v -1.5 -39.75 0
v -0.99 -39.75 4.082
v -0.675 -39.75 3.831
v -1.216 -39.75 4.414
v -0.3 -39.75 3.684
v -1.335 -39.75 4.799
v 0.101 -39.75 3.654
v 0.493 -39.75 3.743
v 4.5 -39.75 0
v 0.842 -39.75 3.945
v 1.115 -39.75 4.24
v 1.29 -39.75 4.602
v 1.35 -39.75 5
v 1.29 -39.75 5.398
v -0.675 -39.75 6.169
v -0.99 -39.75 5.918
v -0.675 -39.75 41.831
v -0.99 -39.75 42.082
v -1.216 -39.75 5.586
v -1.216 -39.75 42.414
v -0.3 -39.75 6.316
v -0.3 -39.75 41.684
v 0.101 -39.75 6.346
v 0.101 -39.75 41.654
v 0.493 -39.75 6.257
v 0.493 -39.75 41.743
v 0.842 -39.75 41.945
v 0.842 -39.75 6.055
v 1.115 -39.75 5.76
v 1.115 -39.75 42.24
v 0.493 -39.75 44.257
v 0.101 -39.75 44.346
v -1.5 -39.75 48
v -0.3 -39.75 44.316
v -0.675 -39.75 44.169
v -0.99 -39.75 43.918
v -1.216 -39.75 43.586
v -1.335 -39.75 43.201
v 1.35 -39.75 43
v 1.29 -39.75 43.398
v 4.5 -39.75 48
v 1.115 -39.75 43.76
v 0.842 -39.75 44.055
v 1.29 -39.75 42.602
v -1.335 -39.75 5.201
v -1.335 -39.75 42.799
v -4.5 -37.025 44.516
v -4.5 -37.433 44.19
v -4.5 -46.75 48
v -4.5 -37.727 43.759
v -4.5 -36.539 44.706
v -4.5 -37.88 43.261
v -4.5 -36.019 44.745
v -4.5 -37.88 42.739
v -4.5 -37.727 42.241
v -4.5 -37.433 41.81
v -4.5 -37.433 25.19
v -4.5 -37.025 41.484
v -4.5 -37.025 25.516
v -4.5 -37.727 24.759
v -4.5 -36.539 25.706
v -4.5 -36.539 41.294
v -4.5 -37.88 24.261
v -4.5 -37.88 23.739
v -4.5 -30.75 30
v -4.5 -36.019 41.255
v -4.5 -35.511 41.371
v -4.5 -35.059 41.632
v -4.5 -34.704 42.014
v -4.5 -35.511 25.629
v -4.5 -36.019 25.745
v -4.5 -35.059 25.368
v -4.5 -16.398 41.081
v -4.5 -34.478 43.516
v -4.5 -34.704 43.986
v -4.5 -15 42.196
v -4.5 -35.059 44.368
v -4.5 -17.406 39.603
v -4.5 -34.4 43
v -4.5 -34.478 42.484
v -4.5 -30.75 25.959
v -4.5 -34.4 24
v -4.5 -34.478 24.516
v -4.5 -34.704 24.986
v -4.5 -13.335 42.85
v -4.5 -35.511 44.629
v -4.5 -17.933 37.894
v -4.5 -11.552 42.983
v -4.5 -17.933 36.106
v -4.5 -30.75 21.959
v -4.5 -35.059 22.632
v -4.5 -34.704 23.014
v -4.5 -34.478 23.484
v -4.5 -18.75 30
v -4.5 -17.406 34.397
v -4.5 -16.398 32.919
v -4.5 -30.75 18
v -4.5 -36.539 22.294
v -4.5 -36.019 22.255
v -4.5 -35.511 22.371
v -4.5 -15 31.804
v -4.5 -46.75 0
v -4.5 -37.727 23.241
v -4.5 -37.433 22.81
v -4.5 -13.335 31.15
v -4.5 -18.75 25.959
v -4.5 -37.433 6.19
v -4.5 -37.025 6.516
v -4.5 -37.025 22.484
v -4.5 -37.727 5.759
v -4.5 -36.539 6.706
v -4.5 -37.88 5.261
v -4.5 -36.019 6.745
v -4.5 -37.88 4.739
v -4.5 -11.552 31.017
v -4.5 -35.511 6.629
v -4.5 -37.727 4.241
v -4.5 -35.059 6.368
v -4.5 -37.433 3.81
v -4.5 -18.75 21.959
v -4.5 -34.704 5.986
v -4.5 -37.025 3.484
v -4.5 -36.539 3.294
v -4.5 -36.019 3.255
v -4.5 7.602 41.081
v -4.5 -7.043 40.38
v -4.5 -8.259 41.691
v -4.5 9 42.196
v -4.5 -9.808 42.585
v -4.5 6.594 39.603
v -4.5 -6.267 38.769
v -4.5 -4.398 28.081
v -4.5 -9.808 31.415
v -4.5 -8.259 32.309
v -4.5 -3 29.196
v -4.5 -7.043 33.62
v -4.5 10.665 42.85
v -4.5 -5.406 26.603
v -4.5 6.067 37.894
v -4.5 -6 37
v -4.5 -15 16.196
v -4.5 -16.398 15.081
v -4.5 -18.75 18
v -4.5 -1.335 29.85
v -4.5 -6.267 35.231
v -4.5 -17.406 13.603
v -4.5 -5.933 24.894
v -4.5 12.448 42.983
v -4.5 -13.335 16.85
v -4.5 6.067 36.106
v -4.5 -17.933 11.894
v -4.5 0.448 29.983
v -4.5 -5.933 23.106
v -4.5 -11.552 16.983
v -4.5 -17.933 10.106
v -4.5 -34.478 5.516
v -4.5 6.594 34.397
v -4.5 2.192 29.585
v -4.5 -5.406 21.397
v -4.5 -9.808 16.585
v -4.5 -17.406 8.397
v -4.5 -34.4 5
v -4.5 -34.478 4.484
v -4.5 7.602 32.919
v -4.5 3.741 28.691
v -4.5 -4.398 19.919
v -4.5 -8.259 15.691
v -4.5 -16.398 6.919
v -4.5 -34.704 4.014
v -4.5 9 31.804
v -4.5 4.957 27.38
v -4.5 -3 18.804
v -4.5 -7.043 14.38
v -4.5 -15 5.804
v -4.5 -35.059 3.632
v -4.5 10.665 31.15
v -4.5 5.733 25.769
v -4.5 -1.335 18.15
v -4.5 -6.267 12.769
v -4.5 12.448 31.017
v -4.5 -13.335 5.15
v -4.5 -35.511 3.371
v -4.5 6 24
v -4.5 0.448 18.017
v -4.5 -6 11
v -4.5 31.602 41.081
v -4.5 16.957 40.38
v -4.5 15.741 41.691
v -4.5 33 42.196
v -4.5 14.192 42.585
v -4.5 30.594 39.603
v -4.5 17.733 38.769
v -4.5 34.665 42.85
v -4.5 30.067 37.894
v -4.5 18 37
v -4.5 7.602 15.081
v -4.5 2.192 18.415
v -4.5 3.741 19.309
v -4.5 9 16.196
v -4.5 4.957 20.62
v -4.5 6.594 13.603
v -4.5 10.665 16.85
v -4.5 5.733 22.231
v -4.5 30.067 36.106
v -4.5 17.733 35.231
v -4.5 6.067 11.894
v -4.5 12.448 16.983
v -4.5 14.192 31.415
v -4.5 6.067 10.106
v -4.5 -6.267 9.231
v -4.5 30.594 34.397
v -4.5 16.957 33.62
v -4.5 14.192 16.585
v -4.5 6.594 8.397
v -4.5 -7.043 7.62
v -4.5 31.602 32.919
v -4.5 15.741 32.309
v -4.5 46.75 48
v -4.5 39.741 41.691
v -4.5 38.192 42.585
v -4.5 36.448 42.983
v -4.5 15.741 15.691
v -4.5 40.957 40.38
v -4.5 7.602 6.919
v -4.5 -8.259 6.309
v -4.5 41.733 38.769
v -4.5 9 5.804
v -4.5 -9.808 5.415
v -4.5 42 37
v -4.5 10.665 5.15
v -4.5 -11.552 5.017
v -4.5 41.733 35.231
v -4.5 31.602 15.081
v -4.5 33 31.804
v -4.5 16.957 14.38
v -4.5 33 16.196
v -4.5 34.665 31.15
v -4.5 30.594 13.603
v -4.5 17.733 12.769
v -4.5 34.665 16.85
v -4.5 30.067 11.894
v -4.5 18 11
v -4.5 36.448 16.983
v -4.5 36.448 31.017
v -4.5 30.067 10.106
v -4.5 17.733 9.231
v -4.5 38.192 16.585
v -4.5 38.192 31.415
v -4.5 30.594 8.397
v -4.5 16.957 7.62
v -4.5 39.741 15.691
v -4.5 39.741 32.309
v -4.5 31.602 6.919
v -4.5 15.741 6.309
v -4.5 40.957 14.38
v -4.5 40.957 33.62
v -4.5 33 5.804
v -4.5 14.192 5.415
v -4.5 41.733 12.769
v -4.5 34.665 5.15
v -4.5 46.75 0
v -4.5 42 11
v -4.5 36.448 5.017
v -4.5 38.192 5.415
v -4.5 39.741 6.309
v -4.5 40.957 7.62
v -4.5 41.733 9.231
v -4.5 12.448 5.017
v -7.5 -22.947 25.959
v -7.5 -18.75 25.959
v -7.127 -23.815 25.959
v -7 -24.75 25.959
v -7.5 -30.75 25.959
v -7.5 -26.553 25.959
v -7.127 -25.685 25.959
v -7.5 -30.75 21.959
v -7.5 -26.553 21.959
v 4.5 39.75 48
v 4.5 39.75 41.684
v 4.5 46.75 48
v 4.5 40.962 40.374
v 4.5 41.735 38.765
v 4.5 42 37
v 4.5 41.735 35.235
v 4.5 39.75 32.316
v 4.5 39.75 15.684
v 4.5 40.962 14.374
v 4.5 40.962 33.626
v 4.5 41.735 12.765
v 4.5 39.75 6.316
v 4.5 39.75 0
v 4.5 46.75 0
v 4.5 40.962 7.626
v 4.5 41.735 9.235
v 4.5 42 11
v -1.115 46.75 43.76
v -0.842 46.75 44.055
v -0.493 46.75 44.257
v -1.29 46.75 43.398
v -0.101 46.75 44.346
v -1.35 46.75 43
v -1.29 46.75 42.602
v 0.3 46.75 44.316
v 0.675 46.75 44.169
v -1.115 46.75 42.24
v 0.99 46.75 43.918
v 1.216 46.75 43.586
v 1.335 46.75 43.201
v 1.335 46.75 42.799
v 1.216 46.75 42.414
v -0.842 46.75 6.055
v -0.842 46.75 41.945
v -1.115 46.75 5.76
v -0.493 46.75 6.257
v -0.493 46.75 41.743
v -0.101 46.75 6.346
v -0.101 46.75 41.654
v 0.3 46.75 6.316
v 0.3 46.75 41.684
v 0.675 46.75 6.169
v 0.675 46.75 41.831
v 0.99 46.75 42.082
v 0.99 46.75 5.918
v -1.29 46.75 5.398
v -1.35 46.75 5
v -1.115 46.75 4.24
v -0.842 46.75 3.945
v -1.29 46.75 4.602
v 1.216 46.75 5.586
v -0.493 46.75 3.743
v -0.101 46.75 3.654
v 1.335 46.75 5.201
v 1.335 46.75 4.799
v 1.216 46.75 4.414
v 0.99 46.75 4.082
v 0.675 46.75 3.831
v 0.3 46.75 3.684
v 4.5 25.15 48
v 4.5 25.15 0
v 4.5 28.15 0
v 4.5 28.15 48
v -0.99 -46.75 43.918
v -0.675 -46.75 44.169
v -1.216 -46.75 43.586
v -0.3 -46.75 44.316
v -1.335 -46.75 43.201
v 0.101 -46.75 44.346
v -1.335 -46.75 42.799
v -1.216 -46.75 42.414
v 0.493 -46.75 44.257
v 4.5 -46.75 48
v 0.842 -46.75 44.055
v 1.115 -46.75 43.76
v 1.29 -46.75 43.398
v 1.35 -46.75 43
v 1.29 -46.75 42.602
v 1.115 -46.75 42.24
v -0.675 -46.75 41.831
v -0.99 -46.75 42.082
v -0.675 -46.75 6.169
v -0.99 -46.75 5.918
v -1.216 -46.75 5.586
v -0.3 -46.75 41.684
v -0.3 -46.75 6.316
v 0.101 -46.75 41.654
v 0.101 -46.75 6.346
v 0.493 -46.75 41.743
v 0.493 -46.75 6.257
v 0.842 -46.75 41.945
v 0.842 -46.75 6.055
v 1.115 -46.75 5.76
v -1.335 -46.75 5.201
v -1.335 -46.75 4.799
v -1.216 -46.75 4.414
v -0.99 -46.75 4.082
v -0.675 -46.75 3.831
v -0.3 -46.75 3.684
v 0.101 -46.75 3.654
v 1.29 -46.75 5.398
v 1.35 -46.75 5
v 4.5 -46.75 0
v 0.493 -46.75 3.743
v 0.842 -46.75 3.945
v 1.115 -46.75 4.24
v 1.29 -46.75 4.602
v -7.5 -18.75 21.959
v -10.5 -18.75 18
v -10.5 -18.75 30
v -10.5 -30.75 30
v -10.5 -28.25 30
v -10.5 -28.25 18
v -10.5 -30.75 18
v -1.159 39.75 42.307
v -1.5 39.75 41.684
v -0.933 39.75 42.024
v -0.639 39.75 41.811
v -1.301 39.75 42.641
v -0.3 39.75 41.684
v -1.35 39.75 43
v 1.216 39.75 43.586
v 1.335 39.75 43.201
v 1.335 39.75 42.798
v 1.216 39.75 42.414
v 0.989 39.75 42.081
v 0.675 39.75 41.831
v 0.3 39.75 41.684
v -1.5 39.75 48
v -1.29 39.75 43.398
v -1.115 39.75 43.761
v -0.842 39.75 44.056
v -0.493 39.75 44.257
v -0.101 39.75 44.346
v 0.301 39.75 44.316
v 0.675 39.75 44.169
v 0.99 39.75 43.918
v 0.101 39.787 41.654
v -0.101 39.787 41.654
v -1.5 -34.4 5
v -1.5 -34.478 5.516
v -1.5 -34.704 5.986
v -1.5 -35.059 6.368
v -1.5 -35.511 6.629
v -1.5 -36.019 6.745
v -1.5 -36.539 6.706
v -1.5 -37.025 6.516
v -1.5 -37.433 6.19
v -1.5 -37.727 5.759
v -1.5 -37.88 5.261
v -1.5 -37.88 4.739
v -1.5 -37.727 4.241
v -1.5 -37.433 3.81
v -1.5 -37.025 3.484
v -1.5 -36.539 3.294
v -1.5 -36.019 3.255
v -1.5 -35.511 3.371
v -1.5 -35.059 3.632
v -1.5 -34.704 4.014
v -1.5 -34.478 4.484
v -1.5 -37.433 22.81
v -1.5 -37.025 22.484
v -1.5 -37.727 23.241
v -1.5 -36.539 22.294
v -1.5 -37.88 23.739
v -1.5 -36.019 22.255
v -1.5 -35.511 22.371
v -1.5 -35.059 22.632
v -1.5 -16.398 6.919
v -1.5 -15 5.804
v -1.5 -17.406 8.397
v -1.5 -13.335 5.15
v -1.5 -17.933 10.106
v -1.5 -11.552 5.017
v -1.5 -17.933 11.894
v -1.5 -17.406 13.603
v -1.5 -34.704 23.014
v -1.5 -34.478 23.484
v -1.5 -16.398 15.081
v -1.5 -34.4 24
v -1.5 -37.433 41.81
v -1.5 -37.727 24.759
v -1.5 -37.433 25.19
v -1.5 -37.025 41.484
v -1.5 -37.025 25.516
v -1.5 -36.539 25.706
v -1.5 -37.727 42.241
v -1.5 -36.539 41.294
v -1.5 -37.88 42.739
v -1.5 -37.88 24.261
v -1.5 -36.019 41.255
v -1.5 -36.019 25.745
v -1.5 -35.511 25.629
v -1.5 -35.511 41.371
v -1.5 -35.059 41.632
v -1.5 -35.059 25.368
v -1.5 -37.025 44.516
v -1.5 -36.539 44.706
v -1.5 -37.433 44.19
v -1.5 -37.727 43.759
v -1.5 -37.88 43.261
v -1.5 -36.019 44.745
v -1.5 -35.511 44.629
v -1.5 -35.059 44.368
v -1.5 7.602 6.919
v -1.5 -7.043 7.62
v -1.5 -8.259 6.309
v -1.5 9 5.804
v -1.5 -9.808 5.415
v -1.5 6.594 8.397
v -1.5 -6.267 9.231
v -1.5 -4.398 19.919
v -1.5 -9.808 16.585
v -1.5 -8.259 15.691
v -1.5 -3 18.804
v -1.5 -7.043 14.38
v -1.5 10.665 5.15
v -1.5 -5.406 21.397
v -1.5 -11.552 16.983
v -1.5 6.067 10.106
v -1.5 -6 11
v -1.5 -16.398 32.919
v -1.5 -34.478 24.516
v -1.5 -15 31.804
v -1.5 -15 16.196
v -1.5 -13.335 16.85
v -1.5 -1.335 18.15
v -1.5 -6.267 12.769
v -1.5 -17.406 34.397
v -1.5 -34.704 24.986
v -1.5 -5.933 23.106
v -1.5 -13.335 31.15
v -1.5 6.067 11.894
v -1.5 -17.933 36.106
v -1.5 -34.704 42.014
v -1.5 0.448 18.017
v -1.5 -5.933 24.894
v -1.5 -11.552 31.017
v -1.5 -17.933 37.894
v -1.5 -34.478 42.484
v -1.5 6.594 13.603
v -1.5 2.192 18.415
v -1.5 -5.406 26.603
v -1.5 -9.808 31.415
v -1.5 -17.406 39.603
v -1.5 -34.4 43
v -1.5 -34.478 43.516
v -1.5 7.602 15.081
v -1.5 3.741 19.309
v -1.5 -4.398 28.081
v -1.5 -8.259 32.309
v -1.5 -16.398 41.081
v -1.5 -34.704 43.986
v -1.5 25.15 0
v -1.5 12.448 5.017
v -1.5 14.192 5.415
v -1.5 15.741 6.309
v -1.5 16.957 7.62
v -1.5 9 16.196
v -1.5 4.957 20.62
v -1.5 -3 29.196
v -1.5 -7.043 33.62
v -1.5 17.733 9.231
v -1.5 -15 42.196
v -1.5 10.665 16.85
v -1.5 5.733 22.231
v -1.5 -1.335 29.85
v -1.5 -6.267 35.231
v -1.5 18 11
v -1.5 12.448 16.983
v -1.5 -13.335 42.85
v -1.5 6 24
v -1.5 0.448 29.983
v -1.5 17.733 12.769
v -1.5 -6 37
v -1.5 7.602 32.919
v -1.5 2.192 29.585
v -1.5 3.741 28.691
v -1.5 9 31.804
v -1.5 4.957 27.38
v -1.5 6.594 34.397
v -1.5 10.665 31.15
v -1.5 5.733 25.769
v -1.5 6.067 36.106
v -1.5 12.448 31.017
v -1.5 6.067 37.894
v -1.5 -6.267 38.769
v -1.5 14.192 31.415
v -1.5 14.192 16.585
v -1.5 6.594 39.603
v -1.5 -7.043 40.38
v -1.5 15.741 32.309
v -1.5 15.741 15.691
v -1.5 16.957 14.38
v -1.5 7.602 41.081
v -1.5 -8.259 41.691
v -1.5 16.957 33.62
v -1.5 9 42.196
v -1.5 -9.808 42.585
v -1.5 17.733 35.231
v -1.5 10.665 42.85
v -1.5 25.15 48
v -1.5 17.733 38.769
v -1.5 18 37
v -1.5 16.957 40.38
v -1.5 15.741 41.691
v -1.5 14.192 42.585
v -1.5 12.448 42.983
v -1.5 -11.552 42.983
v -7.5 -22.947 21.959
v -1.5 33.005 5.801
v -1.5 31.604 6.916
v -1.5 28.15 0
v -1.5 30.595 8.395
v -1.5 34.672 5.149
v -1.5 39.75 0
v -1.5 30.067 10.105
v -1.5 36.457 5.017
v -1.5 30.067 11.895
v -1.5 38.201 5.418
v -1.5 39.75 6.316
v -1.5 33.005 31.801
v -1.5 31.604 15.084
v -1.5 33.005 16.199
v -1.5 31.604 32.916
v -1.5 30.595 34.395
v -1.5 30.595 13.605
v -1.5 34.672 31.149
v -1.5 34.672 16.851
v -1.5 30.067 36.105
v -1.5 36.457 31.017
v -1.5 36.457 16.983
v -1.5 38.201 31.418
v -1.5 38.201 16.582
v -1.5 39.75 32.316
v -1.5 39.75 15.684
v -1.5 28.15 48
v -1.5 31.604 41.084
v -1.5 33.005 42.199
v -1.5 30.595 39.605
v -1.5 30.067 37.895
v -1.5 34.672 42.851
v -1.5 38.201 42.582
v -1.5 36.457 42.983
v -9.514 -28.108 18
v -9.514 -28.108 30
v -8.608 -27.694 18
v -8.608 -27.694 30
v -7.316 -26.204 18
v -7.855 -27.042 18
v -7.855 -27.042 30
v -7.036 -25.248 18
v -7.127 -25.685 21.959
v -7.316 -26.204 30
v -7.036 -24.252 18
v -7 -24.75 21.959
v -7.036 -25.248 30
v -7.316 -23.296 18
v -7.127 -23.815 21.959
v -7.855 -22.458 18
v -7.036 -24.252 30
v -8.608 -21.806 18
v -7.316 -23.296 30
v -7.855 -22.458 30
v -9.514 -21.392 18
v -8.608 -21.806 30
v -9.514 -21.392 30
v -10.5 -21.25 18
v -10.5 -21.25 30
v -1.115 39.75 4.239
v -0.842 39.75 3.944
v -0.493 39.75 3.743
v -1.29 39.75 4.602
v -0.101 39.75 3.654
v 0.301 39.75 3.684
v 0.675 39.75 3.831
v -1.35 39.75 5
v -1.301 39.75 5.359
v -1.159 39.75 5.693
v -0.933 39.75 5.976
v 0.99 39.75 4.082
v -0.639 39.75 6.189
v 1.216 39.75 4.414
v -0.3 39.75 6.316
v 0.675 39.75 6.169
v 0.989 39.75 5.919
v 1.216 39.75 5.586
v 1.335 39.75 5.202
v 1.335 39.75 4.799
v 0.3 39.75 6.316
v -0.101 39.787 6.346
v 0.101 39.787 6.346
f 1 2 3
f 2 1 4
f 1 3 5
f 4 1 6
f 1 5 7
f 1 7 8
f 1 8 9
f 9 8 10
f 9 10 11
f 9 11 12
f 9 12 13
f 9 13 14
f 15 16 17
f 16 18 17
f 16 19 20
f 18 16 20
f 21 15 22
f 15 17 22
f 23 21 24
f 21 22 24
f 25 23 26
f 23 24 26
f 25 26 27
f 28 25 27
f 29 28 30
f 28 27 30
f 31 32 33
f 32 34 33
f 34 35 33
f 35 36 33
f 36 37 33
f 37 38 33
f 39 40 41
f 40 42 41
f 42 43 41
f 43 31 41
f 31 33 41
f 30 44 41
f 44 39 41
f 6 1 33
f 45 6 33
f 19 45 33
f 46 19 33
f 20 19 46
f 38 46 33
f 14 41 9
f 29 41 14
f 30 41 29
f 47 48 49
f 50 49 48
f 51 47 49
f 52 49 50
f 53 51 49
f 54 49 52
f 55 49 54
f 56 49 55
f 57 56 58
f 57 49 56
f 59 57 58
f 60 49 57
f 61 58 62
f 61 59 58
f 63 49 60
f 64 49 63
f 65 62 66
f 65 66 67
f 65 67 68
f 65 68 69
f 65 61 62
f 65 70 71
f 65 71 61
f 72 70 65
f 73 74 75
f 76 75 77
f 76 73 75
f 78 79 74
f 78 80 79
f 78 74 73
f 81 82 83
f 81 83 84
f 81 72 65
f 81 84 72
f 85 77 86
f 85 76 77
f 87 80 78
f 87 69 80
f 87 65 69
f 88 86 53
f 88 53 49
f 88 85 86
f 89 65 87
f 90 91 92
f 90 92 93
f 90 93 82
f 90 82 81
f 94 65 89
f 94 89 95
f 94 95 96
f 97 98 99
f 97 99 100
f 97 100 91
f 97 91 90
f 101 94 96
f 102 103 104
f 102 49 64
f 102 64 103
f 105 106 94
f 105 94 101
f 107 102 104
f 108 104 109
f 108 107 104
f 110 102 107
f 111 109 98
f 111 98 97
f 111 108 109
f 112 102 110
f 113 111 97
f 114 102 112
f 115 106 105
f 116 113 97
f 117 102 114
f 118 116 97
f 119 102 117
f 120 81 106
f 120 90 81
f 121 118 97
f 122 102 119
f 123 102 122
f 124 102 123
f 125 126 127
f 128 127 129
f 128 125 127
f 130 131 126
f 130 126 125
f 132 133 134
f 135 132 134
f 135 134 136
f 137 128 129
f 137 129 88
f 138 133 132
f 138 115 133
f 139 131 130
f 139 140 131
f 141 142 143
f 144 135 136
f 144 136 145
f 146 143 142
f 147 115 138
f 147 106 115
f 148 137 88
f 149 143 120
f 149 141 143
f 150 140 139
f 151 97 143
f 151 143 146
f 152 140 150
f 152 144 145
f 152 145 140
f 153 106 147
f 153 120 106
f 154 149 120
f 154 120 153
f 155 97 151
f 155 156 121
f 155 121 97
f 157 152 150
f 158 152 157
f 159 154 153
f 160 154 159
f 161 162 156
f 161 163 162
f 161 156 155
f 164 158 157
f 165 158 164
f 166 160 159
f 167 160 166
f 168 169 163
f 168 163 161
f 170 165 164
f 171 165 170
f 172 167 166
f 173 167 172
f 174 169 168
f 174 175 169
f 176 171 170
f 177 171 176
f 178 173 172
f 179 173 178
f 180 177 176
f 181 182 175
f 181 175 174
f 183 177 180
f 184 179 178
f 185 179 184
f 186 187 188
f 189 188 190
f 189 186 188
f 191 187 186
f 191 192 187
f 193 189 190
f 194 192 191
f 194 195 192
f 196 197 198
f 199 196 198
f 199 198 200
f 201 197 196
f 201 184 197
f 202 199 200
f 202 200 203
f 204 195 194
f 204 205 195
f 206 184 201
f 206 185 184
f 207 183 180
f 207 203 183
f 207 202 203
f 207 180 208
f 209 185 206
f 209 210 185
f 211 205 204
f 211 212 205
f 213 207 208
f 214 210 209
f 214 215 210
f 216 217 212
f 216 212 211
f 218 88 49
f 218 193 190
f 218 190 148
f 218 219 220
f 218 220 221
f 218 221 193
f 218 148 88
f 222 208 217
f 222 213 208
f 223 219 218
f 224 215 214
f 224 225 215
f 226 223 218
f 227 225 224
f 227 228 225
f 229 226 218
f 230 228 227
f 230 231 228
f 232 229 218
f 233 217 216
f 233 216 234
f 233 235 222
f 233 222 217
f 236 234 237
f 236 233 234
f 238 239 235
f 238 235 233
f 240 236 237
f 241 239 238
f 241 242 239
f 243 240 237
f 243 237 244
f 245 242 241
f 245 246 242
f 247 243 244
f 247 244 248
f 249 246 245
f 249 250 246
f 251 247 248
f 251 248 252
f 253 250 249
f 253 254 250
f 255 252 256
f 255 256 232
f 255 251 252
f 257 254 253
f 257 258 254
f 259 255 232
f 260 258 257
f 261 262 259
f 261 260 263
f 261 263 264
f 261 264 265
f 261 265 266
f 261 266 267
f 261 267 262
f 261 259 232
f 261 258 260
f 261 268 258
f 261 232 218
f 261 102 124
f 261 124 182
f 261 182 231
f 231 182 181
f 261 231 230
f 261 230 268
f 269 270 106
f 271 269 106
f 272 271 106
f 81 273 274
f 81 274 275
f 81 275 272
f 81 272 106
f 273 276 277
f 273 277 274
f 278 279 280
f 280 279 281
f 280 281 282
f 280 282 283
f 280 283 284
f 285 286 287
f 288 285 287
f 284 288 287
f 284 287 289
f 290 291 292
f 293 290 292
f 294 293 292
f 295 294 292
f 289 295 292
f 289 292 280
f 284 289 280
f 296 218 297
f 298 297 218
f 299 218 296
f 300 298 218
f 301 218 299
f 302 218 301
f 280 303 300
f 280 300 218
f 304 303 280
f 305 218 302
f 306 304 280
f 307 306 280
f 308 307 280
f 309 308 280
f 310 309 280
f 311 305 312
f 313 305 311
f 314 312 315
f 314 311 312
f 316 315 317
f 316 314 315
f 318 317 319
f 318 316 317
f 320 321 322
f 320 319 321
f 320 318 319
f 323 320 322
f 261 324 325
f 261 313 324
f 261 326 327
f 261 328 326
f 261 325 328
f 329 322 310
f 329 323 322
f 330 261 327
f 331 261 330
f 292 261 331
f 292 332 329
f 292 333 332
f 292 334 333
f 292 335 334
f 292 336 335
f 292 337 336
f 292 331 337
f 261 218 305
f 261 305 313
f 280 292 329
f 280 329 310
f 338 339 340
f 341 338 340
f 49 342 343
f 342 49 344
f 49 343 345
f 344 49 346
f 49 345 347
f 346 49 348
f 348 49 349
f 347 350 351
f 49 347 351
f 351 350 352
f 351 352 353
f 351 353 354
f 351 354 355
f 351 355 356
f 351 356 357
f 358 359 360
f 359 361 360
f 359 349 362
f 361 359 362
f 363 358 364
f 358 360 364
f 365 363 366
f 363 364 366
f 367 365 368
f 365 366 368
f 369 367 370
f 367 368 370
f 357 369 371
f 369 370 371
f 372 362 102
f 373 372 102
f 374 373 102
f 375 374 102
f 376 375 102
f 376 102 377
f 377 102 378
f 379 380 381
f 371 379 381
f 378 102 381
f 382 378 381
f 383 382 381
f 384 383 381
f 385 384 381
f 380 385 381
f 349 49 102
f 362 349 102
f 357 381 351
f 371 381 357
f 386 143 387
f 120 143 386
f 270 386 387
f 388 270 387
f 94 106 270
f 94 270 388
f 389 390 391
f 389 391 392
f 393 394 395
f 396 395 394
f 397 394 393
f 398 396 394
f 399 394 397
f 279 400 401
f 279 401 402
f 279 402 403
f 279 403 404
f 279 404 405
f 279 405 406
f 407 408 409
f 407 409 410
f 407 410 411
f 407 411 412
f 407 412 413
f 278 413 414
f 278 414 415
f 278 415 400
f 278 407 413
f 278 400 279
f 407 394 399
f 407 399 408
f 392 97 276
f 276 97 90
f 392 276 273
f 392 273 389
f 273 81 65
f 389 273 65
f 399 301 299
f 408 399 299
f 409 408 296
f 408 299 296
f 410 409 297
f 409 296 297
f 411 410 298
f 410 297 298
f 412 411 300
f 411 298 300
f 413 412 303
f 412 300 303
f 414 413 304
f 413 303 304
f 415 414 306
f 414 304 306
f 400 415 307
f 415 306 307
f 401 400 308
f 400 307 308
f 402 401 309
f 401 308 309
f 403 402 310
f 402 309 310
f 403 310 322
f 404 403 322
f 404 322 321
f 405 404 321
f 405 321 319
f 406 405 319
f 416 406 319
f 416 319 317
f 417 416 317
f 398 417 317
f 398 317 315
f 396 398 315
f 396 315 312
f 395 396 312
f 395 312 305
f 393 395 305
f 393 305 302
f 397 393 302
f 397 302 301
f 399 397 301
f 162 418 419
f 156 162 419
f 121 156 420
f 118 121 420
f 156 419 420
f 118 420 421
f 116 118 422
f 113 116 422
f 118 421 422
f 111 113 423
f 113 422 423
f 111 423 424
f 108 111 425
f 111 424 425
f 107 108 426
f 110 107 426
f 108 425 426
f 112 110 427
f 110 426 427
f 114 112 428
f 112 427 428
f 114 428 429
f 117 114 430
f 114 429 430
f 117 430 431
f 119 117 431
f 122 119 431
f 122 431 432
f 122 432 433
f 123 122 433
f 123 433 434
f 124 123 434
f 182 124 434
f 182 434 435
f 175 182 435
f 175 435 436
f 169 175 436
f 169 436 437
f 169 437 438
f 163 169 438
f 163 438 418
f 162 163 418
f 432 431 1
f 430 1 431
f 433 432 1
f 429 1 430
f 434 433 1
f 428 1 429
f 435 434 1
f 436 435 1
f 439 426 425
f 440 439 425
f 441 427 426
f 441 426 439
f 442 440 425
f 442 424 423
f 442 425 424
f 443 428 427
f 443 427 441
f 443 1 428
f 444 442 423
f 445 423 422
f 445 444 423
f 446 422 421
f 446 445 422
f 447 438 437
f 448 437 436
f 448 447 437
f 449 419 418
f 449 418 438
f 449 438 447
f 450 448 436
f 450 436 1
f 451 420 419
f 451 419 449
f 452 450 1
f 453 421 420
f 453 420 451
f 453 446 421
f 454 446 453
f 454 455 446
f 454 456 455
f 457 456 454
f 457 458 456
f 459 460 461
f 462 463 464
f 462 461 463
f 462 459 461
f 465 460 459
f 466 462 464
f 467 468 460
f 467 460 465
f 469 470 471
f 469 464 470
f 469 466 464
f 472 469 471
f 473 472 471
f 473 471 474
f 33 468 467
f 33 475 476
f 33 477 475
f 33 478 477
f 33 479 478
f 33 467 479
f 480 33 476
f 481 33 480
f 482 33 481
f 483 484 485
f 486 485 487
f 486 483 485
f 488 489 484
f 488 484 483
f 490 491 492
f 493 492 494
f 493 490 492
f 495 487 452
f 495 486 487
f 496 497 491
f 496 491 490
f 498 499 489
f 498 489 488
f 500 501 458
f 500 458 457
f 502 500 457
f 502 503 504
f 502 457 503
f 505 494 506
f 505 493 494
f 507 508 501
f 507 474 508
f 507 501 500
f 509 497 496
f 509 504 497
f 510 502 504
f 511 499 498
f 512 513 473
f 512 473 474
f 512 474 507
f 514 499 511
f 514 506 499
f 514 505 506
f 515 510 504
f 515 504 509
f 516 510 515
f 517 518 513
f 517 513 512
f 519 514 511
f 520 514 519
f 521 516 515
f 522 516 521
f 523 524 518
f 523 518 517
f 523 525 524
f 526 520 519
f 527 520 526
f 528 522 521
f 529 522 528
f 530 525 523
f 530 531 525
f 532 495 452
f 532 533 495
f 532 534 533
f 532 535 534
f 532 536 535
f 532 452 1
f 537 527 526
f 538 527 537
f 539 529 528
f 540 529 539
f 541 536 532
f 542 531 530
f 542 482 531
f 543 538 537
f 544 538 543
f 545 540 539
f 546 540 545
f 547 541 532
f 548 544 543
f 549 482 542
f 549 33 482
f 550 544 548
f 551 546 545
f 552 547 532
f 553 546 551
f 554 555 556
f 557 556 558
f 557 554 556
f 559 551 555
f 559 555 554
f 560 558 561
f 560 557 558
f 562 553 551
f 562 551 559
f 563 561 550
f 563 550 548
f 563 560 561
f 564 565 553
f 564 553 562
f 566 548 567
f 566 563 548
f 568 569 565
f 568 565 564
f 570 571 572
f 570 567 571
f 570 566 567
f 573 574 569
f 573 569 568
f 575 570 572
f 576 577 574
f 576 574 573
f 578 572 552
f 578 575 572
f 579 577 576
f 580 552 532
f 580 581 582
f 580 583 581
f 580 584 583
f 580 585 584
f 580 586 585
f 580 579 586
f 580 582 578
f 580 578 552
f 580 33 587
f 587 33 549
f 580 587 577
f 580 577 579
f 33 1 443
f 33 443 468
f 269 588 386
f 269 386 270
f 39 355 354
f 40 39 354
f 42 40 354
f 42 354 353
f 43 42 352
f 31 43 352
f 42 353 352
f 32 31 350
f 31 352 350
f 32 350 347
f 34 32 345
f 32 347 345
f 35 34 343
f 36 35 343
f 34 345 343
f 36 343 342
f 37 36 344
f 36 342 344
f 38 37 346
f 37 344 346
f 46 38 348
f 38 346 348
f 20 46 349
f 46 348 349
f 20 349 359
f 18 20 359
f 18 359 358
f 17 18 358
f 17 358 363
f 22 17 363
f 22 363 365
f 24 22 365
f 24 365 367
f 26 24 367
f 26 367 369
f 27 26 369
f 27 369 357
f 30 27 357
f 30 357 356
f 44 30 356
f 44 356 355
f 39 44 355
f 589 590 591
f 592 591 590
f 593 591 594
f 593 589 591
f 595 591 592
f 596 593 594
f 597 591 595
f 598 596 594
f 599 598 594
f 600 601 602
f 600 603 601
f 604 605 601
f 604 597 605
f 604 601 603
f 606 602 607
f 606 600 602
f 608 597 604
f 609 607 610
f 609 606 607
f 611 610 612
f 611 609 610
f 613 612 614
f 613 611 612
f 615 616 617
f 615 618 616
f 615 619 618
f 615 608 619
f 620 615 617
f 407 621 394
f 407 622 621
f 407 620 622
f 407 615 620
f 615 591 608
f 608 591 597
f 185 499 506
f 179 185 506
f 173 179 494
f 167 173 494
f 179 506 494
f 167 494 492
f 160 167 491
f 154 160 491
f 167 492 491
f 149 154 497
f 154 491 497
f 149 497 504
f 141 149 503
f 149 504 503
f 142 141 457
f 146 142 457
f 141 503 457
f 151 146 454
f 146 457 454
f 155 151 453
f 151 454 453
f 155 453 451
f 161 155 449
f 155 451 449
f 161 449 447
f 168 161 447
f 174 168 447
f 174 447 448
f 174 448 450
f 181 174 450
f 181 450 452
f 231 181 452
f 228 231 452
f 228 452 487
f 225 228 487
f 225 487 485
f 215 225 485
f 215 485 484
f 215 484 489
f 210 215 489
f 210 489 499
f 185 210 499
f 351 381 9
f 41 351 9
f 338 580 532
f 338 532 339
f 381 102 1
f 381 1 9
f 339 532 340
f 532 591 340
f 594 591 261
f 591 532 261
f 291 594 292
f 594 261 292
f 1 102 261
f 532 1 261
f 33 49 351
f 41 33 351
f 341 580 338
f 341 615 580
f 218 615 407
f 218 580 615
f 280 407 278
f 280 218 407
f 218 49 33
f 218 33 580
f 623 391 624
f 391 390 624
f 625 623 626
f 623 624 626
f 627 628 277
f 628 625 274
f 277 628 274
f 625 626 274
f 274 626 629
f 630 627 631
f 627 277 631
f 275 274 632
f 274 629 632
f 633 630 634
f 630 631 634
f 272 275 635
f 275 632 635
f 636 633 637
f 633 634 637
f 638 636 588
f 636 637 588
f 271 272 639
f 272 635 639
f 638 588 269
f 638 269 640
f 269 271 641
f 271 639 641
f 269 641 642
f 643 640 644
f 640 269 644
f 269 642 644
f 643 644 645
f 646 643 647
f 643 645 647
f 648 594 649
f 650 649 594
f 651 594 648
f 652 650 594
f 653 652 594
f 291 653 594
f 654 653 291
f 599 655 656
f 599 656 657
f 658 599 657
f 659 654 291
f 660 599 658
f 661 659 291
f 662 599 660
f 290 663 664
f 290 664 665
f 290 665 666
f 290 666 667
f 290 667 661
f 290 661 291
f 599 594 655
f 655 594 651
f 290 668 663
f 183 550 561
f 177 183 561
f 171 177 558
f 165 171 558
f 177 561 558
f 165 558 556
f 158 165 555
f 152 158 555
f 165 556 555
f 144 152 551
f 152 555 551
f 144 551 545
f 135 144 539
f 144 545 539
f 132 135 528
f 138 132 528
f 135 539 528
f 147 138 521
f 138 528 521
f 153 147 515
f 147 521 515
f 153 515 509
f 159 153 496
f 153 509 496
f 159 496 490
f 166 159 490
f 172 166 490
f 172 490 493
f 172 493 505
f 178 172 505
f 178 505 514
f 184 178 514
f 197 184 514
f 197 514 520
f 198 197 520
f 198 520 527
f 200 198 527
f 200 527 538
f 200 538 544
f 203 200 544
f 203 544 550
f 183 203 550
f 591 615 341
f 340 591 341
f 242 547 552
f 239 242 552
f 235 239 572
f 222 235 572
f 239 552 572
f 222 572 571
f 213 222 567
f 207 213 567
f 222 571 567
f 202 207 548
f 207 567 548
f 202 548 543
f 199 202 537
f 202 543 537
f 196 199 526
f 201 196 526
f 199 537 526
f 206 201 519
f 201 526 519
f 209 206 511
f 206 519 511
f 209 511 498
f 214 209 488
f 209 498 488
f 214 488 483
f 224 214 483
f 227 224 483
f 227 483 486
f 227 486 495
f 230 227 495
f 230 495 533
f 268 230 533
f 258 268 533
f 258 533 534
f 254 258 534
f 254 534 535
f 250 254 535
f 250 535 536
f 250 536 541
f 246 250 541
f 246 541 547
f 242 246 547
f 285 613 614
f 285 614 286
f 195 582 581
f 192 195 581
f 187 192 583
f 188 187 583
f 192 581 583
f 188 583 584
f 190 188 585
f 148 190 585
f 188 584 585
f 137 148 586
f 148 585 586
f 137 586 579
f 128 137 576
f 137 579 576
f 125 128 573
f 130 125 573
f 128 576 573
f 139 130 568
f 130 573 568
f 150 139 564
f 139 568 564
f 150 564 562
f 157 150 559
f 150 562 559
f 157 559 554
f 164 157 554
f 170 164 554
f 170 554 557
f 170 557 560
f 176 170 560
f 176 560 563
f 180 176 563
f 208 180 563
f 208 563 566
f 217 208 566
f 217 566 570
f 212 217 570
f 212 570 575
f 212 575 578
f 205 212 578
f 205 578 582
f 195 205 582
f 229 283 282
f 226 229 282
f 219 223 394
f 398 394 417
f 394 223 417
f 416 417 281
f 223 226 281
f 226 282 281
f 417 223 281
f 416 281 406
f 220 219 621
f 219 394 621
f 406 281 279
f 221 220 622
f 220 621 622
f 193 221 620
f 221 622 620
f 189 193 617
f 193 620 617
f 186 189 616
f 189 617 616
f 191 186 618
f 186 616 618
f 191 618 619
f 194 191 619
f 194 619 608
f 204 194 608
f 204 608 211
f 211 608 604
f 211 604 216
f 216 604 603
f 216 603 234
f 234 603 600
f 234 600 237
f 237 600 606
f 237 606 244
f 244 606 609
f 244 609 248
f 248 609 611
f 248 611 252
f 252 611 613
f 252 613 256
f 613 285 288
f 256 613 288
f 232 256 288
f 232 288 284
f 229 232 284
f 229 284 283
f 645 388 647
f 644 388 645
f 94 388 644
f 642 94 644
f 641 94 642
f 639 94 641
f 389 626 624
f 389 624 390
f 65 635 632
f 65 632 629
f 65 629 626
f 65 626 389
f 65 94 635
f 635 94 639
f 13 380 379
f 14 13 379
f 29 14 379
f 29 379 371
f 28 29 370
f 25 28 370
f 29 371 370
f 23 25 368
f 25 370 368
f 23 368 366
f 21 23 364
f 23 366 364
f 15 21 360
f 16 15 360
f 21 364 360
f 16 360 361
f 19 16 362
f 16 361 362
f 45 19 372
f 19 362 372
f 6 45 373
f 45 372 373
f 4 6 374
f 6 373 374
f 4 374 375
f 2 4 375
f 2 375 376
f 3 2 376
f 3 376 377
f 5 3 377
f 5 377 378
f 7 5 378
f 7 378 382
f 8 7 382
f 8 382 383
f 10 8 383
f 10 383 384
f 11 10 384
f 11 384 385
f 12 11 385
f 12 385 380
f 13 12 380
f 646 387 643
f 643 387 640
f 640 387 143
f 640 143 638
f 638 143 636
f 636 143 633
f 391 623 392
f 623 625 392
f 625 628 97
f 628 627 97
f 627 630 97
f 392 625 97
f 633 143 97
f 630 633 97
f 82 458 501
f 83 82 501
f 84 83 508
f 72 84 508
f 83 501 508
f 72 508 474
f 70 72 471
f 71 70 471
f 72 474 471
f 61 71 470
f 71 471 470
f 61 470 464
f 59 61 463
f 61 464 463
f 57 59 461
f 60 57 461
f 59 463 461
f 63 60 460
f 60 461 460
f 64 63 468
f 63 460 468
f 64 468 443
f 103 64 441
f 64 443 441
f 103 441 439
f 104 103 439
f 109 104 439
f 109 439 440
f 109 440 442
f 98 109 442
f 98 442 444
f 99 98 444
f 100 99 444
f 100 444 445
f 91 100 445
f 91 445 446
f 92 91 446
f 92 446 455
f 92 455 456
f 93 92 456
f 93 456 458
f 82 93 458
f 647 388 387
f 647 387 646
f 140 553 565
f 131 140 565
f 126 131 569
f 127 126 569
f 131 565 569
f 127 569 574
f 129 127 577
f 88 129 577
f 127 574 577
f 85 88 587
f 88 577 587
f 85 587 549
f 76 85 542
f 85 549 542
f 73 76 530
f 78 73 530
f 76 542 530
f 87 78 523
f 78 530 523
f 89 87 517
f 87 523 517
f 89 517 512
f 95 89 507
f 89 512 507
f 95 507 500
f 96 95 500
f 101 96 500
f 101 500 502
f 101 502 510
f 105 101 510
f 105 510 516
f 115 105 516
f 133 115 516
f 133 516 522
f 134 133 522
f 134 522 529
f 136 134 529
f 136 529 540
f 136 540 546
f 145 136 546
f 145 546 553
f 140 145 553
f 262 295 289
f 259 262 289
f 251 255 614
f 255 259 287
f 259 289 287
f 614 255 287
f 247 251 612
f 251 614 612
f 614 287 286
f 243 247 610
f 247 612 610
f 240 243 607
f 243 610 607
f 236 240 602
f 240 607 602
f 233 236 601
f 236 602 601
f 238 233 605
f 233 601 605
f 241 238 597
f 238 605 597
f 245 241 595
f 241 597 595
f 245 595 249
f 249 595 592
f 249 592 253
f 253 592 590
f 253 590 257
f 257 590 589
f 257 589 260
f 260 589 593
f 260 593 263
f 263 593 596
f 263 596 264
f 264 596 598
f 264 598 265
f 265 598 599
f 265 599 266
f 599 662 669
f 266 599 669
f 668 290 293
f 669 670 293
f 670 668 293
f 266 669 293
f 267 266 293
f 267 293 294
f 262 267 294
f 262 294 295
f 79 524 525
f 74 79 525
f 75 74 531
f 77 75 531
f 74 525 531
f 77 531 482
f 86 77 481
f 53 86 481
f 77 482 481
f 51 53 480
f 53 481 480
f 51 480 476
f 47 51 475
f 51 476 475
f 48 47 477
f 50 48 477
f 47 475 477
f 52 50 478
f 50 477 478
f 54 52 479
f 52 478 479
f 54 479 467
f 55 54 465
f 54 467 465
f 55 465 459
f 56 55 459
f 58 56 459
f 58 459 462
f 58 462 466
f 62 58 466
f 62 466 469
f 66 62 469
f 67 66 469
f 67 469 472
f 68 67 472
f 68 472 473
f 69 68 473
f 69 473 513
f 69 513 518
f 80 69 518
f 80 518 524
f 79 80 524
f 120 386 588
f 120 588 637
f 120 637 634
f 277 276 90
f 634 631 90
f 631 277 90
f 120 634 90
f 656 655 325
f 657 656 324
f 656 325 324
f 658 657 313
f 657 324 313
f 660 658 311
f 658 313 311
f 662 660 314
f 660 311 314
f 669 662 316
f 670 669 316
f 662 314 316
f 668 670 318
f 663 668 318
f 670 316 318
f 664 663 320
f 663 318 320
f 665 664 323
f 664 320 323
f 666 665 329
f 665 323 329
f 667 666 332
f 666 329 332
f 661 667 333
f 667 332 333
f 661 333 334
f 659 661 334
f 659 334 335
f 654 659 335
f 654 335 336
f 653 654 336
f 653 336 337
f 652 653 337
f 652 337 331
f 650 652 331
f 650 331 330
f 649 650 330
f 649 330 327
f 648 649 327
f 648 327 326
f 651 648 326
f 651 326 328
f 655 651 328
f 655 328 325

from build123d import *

# Parameters (mm, degrees)
F0_W      = 9
F0_H      = 93.5
F1_DEPTH  = 48
F2_R      = 1.35
F3_DEPTH  = 8
F4_R      = 1.35
F5_DEPTH  = 8
F6_R      = 1.75
F7_DEPTH  = 9.001
F8_R      = 6
F9_DEPTH  = 9.001
F10_W     = 6
F10_H     = 64.9
F10_H_2   = 11.6
F11_DEPTH = 48.001
F12_W     = 12
F12_H     = 12
F13_DEPTH = 6
F14_W     = 3
F14_H     = 4
F15_DEPTH = 12
F16_R     = 3.5
F17_DEPTH = 30.001


with BuildPart() as f1:
    # F0 (on Top) → F1 (new body)
    with BuildSketch(Plane.XY):
        Rectangle(F0_W, F0_H)
    extrude(amount=F1_DEPTH)

    # F2 (on face) → F3 (cut)
    with BuildSketch(Plane.XZ.offset(46.75)):
        with Locations((0, 43)):
            Circle(F2_R)
        with Locations((0, 5)):
            Circle(F2_R)
    extrude(amount=-F3_DEPTH, mode=Mode.SUBTRACT)

    # F4 (on face) → F5 (cut)
    with BuildSketch(Plane(origin=(0, 46.75, 0), x_dir=(-1, 0, 0), z_dir=(0, 1, 0))):
        with Locations((0, 43)):
            Circle(F4_R)
        with Locations((0, 5)):
            Circle(F4_R)
    extrude(amount=-F5_DEPTH, mode=Mode.SUBTRACT)

    # F6 (on face) → F7 (cut, through all)
    with BuildSketch(Plane.YZ.offset(4.5)):
        with Locations((-36.15, 43)):
            Circle(F6_R)
        with Locations((-36.15, 24)):
            Circle(F6_R)
        with Locations((-36.15, 5)):
            Circle(F6_R)
    extrude(amount=-F7_DEPTH, mode=Mode.SUBTRACT)

    # F8 (on face) → F9 (cut, through all)
    with BuildSketch(Plane.YZ.offset(4.5)):
        with Locations((-12, 11)):
            Circle(F8_R)
        with Locations((0, 24)):
            Circle(F8_R)
        with Locations((-12, 37)):
            Circle(F8_R)
        with Locations((12, 11)):
            Circle(F8_R)
        with Locations((12, 37)):
            Circle(F8_R)
        with Locations((36, 11)):
            Circle(F8_R)
        with Locations((36, 37)):
            Circle(F8_R)
    extrude(amount=-F9_DEPTH, mode=Mode.SUBTRACT)

    # F10 (on face) → F11 (cut, through all)
    with BuildSketch(Plane.XY.offset(48)):
        with Locations((1.5, -7.3)):
            Rectangle(F10_W, F10_H)
        with Locations((1.5, 33.95)):
            Rectangle(F10_W, F10_H_2)
    extrude(amount=-F11_DEPTH, mode=Mode.SUBTRACT)

    # F12 (on face) → F13 (join)
    with BuildSketch(Plane(origin=(-4.5, 0, 0), x_dir=(0, -1, 0), z_dir=(-1, 0, 0))):
        with Locations((24.75, 24)):
            Rectangle(F12_W, F12_H)
    extrude(amount=F13_DEPTH)

    # F14 (on face) → F15 (cut, through all)
    with BuildSketch(Plane.XZ.offset(30.75)):
        with Locations((-6, 23.958516)):
            Rectangle(F14_W, F14_H)
    extrude(amount=-F15_DEPTH, mode=Mode.SUBTRACT)

    # F16 (on face) → F17 (cut, through all)
    with BuildSketch(Plane.XY.offset(30)):
        with Locations((-10.5, -24.75)):
            Circle(F16_R)
    extrude(amount=-F17_DEPTH, mode=Mode.SUBTRACT)


solid = f1.part
